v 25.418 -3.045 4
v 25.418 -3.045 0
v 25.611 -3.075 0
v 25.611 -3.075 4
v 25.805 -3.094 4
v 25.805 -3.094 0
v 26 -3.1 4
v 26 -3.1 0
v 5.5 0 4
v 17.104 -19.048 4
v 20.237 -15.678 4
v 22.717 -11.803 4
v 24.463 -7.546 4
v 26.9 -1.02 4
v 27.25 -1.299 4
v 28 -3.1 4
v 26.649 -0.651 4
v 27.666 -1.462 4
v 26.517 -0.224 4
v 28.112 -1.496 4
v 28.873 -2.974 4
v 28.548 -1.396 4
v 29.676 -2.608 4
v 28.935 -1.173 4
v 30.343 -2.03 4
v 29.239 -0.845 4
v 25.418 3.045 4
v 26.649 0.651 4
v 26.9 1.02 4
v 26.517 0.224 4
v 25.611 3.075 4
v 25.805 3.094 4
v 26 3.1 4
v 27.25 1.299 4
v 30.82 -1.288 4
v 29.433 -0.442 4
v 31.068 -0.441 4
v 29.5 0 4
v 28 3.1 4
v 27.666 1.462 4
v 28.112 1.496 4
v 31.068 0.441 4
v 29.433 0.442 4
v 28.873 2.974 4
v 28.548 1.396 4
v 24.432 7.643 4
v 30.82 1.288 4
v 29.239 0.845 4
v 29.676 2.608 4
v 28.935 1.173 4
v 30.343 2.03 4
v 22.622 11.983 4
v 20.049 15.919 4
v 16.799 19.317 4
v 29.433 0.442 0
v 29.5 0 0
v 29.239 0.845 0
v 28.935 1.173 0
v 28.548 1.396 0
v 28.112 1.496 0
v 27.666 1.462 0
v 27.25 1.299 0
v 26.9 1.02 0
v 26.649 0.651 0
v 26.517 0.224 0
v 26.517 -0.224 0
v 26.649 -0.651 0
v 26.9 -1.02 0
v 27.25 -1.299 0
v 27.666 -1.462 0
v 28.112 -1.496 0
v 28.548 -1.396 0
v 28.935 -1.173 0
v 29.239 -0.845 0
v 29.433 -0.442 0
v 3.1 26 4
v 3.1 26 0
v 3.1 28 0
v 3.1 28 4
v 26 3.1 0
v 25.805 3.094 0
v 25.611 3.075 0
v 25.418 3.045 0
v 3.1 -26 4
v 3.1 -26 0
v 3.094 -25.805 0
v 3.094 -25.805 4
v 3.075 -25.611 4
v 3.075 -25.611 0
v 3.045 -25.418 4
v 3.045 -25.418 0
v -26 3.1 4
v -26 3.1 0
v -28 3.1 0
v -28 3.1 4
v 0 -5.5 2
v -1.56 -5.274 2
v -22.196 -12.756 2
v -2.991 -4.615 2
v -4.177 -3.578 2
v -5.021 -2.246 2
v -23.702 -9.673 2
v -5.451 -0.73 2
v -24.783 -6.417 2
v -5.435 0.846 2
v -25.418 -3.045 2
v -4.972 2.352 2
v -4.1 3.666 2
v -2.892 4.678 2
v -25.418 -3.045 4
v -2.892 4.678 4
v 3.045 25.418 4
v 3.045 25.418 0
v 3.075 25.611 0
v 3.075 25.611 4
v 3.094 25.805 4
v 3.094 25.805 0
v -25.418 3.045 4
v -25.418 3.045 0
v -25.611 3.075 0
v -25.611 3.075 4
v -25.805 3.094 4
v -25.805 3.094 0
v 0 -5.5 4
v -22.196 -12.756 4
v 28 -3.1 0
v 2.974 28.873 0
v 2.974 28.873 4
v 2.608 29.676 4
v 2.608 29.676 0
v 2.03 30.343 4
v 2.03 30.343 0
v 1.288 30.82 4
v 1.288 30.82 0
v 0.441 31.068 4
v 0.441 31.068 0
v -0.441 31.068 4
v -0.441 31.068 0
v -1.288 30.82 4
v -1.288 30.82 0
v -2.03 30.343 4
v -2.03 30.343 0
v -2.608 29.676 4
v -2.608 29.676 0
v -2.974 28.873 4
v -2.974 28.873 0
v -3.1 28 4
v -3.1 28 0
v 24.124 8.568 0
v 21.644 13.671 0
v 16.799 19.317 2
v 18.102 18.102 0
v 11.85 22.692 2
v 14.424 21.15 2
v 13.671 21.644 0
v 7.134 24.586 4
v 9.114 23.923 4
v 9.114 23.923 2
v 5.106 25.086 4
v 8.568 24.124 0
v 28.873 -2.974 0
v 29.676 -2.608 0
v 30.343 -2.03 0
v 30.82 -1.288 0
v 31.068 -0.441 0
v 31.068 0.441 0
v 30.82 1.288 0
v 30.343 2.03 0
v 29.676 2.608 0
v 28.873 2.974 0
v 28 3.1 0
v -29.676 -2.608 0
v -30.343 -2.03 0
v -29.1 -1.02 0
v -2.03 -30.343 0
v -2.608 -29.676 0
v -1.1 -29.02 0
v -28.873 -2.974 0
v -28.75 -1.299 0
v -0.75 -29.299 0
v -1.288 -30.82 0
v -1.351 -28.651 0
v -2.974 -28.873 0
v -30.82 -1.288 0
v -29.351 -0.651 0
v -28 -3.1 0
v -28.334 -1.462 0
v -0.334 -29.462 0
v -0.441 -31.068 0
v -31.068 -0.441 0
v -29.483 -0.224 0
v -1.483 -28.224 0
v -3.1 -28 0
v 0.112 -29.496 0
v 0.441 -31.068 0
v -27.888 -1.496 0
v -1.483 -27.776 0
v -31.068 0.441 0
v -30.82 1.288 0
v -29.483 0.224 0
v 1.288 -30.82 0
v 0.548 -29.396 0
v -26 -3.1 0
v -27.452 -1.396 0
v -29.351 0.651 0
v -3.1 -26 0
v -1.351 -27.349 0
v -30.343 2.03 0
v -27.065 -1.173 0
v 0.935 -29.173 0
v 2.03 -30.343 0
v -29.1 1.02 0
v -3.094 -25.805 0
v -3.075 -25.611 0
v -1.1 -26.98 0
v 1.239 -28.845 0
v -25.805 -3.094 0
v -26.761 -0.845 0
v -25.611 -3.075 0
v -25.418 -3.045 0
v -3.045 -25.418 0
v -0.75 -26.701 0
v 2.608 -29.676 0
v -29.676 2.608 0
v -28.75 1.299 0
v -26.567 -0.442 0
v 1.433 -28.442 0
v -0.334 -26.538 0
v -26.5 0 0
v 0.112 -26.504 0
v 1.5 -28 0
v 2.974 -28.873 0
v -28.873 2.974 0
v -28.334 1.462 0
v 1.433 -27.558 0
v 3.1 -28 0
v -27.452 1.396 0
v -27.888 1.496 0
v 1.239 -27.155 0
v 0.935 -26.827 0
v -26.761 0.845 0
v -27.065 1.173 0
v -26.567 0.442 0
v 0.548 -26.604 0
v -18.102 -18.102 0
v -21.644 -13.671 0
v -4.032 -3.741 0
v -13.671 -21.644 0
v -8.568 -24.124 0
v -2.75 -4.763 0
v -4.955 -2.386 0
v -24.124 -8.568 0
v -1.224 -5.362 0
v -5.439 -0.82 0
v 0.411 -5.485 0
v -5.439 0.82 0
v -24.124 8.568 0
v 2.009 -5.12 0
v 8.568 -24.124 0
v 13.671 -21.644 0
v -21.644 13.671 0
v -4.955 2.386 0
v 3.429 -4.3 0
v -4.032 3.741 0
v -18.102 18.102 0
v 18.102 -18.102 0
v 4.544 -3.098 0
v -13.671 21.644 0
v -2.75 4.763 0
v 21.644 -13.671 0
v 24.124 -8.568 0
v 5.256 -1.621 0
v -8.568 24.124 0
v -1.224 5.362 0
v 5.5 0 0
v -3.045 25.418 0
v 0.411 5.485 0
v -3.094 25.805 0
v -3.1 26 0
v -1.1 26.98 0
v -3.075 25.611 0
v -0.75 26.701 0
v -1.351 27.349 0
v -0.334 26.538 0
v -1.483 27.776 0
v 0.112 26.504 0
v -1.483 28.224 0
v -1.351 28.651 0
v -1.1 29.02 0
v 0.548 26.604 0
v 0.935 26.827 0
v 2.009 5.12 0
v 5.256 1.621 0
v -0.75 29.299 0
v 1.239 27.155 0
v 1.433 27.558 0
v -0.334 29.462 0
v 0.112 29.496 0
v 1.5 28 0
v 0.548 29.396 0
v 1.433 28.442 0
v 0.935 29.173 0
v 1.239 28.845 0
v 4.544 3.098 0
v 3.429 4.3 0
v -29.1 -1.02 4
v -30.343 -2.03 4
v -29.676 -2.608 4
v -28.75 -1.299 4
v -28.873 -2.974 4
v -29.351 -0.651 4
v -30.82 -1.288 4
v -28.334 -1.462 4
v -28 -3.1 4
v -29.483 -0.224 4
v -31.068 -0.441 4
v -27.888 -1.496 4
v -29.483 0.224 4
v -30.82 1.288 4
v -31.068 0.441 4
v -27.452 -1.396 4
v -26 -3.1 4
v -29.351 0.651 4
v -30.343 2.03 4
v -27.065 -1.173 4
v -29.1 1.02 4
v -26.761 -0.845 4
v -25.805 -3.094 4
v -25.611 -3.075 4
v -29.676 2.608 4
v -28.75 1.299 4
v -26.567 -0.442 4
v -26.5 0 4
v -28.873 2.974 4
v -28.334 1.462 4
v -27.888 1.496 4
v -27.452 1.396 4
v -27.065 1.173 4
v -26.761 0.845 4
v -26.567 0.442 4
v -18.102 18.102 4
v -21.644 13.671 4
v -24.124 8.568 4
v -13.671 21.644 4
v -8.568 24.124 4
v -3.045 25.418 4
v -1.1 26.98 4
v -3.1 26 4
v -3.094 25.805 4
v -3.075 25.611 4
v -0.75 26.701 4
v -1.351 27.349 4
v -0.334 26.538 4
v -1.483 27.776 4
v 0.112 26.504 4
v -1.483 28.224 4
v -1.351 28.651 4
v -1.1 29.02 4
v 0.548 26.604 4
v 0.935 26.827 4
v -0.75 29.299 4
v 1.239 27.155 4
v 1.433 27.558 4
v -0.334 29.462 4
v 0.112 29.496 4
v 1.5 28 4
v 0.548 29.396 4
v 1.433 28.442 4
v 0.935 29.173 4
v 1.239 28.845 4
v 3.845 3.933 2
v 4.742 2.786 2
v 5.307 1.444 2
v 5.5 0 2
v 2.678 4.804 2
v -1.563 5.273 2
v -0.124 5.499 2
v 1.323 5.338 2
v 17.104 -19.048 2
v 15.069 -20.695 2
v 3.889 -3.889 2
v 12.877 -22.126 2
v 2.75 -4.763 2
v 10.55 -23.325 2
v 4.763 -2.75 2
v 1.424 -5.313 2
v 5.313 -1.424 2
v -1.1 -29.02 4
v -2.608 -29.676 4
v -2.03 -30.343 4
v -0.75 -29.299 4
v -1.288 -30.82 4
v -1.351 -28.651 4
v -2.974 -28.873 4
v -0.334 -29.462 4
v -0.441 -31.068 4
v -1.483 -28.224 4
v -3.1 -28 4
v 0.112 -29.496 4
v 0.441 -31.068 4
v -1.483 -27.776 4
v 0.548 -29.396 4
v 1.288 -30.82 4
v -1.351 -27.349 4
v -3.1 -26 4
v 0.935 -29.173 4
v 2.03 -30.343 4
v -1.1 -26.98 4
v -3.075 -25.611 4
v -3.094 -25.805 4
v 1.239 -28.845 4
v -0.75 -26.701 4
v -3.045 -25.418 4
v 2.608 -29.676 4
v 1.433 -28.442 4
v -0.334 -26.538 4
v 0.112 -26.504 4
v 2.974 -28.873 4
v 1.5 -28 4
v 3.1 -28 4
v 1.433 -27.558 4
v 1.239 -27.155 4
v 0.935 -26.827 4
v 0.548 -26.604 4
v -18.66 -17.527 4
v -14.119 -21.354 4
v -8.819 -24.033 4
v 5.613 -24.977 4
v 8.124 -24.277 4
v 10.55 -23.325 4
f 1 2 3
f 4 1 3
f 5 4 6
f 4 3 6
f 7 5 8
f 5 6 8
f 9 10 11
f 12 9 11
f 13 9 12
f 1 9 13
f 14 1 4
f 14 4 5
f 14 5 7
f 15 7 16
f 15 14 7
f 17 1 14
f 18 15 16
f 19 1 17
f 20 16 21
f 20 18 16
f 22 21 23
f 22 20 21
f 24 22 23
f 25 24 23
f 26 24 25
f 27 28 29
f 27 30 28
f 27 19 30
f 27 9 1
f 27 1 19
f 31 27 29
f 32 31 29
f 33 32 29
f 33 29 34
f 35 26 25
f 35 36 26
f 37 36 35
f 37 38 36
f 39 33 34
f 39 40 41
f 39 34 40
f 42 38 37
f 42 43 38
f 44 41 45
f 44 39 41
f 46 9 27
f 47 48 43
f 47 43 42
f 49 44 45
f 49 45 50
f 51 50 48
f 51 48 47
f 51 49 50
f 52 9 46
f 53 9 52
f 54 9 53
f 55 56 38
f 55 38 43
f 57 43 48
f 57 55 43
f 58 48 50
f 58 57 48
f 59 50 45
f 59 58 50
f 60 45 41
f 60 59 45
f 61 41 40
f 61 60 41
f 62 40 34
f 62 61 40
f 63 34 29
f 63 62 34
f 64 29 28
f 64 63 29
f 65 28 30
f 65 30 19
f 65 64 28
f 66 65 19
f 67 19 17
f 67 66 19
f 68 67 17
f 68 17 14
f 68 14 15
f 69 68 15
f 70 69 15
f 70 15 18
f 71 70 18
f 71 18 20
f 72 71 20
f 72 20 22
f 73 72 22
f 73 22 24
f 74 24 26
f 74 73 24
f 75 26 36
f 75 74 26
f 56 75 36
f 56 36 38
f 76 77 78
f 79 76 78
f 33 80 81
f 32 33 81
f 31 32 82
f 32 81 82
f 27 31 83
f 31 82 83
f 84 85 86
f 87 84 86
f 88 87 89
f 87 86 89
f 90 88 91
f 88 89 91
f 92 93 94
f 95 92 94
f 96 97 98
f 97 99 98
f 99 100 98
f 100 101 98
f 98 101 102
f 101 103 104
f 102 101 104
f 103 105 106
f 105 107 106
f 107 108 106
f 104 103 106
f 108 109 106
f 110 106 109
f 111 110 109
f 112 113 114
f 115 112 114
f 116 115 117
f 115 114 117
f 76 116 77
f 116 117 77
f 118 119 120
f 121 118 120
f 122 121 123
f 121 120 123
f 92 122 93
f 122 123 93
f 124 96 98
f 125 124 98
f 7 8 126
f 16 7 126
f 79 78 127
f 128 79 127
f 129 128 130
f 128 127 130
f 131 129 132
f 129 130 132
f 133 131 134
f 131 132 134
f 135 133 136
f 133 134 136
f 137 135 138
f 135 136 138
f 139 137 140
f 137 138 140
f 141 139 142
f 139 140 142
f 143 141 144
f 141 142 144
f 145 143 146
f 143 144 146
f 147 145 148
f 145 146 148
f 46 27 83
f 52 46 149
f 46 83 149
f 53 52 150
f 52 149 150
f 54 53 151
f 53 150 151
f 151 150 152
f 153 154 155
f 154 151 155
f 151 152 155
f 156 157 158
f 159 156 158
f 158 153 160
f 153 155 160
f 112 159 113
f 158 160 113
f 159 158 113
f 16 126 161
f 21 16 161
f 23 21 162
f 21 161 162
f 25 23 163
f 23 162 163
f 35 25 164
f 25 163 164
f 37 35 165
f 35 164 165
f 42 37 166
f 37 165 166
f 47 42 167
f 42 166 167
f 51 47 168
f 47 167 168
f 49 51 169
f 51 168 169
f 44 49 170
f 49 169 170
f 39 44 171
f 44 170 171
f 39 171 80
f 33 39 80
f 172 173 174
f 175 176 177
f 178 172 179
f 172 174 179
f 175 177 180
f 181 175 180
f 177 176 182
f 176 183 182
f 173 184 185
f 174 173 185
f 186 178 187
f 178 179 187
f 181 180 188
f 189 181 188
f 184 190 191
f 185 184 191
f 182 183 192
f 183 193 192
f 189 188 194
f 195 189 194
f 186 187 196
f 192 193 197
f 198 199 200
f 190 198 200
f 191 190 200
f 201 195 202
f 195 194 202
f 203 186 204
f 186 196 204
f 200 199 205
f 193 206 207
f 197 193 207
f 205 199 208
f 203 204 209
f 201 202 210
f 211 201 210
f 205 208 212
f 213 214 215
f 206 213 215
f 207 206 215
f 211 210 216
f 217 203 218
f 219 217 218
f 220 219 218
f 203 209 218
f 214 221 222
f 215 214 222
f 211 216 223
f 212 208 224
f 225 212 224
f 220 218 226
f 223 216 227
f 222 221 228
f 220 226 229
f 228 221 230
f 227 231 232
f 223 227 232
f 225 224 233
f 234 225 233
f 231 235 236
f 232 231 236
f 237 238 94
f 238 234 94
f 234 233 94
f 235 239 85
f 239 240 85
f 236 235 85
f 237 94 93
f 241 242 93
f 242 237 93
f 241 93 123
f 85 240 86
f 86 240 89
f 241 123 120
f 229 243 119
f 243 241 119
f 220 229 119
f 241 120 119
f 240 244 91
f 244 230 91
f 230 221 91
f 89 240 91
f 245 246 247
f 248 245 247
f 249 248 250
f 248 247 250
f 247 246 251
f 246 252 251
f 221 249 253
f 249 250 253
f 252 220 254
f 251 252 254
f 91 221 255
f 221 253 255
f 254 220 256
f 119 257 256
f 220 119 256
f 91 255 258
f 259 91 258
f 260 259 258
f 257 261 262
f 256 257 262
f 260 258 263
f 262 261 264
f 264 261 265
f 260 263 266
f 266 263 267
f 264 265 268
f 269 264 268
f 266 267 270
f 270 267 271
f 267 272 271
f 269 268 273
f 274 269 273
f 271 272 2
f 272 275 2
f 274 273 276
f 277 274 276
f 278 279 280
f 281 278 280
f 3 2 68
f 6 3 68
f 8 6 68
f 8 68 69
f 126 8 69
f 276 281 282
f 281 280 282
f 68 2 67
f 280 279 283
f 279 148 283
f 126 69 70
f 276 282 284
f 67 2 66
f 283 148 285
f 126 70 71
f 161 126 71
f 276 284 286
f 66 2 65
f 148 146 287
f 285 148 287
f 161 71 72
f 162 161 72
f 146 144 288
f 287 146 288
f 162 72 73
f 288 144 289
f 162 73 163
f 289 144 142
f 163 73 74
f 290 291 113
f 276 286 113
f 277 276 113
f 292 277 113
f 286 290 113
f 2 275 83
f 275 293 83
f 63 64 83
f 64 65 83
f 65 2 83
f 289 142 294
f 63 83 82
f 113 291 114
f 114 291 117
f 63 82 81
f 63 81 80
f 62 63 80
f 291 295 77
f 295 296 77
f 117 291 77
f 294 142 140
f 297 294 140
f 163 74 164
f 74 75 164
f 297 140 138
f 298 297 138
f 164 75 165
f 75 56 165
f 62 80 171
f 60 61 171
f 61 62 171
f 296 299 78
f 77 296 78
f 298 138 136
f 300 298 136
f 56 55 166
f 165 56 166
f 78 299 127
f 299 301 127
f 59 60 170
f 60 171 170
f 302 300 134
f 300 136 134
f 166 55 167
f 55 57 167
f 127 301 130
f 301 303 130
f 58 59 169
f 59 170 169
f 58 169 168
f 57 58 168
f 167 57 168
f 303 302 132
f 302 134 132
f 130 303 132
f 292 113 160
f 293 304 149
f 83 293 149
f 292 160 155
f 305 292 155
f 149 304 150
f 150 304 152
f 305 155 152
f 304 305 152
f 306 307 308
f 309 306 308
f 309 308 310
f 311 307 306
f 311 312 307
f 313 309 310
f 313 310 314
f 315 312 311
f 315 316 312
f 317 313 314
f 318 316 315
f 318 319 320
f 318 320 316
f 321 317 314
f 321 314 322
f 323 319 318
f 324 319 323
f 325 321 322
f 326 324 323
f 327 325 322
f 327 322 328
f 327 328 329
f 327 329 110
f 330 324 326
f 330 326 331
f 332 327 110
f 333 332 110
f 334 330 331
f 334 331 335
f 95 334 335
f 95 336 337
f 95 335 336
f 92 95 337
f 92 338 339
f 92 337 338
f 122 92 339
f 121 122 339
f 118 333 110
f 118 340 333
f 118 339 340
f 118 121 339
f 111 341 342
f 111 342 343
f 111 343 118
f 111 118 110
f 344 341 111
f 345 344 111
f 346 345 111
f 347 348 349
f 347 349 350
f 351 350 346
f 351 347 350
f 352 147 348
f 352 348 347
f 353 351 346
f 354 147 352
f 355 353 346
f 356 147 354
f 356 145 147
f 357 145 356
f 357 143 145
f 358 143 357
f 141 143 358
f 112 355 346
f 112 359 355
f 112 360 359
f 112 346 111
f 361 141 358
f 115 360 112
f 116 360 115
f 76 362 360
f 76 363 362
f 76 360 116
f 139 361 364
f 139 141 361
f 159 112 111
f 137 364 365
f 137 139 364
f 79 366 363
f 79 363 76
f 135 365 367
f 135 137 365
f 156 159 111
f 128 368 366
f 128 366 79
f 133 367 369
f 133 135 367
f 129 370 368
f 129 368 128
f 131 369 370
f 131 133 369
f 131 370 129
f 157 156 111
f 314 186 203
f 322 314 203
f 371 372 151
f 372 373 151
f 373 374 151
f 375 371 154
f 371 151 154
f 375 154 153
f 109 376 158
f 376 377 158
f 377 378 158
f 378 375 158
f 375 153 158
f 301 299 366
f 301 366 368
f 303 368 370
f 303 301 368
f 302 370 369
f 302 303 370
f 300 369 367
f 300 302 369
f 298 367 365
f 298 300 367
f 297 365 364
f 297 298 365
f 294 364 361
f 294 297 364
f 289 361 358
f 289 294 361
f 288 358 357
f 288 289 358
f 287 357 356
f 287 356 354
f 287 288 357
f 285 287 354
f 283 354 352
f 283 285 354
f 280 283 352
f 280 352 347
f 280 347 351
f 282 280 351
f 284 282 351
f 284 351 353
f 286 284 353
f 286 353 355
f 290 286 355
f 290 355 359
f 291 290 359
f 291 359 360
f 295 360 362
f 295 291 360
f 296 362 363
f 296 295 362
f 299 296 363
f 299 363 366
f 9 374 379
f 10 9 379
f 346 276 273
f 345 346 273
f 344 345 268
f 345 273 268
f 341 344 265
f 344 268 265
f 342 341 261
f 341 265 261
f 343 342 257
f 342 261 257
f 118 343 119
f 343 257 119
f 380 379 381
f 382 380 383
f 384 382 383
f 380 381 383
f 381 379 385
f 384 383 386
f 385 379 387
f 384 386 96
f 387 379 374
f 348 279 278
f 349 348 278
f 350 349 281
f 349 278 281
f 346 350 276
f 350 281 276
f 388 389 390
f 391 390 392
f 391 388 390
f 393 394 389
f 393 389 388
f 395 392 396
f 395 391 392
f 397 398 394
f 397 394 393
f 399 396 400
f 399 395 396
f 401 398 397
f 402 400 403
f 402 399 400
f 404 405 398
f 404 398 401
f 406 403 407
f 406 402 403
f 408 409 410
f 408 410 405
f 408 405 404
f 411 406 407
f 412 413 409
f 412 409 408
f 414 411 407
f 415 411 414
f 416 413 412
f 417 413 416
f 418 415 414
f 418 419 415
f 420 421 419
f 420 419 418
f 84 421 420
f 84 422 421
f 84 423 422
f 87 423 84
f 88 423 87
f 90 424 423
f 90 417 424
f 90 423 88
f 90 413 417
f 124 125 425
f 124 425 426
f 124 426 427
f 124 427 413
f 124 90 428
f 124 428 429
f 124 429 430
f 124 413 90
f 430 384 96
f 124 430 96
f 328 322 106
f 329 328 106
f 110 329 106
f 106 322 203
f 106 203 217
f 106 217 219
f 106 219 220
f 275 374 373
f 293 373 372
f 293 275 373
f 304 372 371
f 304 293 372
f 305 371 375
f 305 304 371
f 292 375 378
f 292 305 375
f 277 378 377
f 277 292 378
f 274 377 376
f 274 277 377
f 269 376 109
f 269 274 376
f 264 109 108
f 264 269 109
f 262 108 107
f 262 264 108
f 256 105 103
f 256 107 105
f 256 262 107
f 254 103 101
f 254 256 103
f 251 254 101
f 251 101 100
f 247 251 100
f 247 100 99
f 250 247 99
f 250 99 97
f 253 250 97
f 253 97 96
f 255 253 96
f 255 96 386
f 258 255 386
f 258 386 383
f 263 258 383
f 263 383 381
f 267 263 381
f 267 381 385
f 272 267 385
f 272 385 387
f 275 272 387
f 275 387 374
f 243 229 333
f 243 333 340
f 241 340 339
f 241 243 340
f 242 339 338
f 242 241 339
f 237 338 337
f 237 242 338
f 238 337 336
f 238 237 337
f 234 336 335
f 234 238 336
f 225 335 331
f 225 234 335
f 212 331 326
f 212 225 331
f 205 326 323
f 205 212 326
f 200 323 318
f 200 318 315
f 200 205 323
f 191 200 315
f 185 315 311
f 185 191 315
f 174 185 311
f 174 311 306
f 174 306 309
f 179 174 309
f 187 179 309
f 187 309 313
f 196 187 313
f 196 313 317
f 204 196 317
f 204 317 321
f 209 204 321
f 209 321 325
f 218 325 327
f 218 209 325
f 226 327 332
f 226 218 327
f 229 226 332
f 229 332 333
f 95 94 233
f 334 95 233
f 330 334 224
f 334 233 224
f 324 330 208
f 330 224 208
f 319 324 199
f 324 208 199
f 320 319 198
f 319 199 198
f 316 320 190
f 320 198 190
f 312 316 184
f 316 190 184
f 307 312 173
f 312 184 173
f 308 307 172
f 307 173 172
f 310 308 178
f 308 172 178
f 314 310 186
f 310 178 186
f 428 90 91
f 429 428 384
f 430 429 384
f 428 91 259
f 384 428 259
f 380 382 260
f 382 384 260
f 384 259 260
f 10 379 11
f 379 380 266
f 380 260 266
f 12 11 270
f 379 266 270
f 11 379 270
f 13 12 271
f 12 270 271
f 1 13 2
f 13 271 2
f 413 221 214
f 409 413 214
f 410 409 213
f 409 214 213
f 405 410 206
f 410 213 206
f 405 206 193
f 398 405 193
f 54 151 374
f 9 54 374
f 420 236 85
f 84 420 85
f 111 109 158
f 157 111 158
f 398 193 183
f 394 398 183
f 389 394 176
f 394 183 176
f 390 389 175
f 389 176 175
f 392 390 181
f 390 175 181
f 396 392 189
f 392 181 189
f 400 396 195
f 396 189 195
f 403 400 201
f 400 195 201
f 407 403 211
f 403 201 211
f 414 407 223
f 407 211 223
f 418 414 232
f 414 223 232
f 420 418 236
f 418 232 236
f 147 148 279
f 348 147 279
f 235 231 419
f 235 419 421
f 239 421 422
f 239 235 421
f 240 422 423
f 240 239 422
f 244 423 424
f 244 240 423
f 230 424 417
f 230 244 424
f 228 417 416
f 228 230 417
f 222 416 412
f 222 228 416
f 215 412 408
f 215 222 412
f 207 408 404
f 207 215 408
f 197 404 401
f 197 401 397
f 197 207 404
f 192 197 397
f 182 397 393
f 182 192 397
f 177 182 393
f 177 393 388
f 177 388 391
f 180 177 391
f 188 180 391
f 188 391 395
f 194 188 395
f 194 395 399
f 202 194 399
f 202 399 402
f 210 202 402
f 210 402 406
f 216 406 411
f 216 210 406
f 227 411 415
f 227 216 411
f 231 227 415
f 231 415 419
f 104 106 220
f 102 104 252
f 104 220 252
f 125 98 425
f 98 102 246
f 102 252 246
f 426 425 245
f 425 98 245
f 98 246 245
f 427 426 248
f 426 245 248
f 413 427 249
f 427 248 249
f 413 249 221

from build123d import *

# Parameters (mm, degrees)
SKETCH4_R           = 5.5
SKETCH4_R_2         = 1.5
BOSS_EXTRUDE2_DEPTH = 4
CUT_EXTRUDE1_START  = -2
CUT_EXTRUDE1_DEPTH  = 2


with BuildPart() as part:
    # Sketch4 → Boss-Extrude2 (new body)
    with BuildSketch(Plane.XY):
        with BuildLine():
            Line((28, 3.1), (26, 3.1))
            ThreePointArc((26, 3.1), (25.707834138, 3.086201405), (25.418269231, 3.044928458))
            ThreePointArc((25.418269231, 3.044928458), (18.101933598, 18.101933598), (3.044928458, 25.418269231))
            ThreePointArc((3.044928458, 25.418269231), (3.086201405, 25.707834138), (3.1, 26))
            Line((3.1, 26), (3.1, 28))
            ThreePointArc((3.1, 28), (0, 31.1), (-3.1, 28))
            Line((-3.1, 28), (-3.1, 26))
            ThreePointArc((-3.1, 26), (-3.086201405, 25.707834138), (-3.044928458, 25.418269231))
            ThreePointArc((-3.044928458, 25.418269231), (-18.101933598, 18.101933598), (-25.418269231, 3.044928458))
            ThreePointArc((-25.418269231, 3.044928458), (-25.707834138, 3.086201405), (-26, 3.1))
            Line((-26, 3.1), (-28, 3.1))
            ThreePointArc((-28, 3.1), (-31.1, 0), (-28, -3.1))
            Line((-28, -3.1), (-26, -3.1))
            ThreePointArc((-26, -3.1), (-25.707834138, -3.086201405), (-25.418269231, -3.044928458))
            ThreePointArc((-25.418269231, -3.044928458), (-18.101933598, -18.101933598), (-3.044928458, -25.418269231))
            ThreePointArc((-3.044928458, -25.418269231), (-3.086201405, -25.707834138), (-3.1, -26))
            Line((-3.1, -26), (-3.1, -28))
            ThreePointArc((-3.1, -28), (0, -31.1), (3.1, -28))
            Line((3.1, -28), (3.1, -26))
            ThreePointArc((3.1, -26), (3.086201405, -25.707834138), (3.044928458, -25.418269231))
            ThreePointArc((3.044928458, -25.418269231), (18.101933598, -18.101933598), (25.418269231, -3.044928458))
            ThreePointArc((25.418269231, -3.044928458), (25.707834138, -3.086201405), (26, -3.1))
            Line((26, -3.1), (28, -3.1))
            ThreePointArc((28, -3.1), (31.1, 0), (28, 3.1))
        make_face()
        Circle(SKETCH4_R, mode=Mode.SUBTRACT)
        with Locations((-28, 0)):
            Circle(SKETCH4_R_2, mode=Mode.SUBTRACT)
        with Locations((0, 28)):
            Circle(SKETCH4_R_2, mode=Mode.SUBTRACT)
        with Locations((28, 0)):
            Circle(SKETCH4_R_2, mode=Mode.SUBTRACT)
        with Locations((0, -28)):
            Circle(SKETCH4_R_2, mode=Mode.SUBTRACT)
    extrude(amount=BOSS_EXTRUDE2_DEPTH)

    # Sketch5 → Cut-Extrude1 (cut)
    with BuildSketch(Plane.XY.offset(4).offset(CUT_EXTRUDE1_START)):
        with BuildLine():
            Line((-25.418269231, -3.044928458), (-2.892398424, 4.678037126))
            Line((-2.892398424, 4.678037126), (9.11402937, 23.92267687))
            ThreePointArc((9.11402937, 23.92267687), (13.159458029, 21.958794693), (16.798827647, 19.317333918))
            Line((16.798827647, 19.317333918), (5.5, 0))
            Line((5.5, 0), (17.104166933, -19.047505704))
            ThreePointArc((17.104166933, -19.047505704), (13.991450126, -21.438267733), (10.549853348, -23.325106524))
            Line((10.549853348, -23.325106524), (0, -5.5))
            Line((0, -5.5), (-22.195690438, -12.755834977))
            ThreePointArc((-22.195690438, -12.755834977), (-24.297072153, -8.063019583), (-25.418269231, -3.044928458))
        make_face()
    extrude(amount=CUT_EXTRUDE1_DEPTH, mode=Mode.SUBTRACT)


solid = part.part
